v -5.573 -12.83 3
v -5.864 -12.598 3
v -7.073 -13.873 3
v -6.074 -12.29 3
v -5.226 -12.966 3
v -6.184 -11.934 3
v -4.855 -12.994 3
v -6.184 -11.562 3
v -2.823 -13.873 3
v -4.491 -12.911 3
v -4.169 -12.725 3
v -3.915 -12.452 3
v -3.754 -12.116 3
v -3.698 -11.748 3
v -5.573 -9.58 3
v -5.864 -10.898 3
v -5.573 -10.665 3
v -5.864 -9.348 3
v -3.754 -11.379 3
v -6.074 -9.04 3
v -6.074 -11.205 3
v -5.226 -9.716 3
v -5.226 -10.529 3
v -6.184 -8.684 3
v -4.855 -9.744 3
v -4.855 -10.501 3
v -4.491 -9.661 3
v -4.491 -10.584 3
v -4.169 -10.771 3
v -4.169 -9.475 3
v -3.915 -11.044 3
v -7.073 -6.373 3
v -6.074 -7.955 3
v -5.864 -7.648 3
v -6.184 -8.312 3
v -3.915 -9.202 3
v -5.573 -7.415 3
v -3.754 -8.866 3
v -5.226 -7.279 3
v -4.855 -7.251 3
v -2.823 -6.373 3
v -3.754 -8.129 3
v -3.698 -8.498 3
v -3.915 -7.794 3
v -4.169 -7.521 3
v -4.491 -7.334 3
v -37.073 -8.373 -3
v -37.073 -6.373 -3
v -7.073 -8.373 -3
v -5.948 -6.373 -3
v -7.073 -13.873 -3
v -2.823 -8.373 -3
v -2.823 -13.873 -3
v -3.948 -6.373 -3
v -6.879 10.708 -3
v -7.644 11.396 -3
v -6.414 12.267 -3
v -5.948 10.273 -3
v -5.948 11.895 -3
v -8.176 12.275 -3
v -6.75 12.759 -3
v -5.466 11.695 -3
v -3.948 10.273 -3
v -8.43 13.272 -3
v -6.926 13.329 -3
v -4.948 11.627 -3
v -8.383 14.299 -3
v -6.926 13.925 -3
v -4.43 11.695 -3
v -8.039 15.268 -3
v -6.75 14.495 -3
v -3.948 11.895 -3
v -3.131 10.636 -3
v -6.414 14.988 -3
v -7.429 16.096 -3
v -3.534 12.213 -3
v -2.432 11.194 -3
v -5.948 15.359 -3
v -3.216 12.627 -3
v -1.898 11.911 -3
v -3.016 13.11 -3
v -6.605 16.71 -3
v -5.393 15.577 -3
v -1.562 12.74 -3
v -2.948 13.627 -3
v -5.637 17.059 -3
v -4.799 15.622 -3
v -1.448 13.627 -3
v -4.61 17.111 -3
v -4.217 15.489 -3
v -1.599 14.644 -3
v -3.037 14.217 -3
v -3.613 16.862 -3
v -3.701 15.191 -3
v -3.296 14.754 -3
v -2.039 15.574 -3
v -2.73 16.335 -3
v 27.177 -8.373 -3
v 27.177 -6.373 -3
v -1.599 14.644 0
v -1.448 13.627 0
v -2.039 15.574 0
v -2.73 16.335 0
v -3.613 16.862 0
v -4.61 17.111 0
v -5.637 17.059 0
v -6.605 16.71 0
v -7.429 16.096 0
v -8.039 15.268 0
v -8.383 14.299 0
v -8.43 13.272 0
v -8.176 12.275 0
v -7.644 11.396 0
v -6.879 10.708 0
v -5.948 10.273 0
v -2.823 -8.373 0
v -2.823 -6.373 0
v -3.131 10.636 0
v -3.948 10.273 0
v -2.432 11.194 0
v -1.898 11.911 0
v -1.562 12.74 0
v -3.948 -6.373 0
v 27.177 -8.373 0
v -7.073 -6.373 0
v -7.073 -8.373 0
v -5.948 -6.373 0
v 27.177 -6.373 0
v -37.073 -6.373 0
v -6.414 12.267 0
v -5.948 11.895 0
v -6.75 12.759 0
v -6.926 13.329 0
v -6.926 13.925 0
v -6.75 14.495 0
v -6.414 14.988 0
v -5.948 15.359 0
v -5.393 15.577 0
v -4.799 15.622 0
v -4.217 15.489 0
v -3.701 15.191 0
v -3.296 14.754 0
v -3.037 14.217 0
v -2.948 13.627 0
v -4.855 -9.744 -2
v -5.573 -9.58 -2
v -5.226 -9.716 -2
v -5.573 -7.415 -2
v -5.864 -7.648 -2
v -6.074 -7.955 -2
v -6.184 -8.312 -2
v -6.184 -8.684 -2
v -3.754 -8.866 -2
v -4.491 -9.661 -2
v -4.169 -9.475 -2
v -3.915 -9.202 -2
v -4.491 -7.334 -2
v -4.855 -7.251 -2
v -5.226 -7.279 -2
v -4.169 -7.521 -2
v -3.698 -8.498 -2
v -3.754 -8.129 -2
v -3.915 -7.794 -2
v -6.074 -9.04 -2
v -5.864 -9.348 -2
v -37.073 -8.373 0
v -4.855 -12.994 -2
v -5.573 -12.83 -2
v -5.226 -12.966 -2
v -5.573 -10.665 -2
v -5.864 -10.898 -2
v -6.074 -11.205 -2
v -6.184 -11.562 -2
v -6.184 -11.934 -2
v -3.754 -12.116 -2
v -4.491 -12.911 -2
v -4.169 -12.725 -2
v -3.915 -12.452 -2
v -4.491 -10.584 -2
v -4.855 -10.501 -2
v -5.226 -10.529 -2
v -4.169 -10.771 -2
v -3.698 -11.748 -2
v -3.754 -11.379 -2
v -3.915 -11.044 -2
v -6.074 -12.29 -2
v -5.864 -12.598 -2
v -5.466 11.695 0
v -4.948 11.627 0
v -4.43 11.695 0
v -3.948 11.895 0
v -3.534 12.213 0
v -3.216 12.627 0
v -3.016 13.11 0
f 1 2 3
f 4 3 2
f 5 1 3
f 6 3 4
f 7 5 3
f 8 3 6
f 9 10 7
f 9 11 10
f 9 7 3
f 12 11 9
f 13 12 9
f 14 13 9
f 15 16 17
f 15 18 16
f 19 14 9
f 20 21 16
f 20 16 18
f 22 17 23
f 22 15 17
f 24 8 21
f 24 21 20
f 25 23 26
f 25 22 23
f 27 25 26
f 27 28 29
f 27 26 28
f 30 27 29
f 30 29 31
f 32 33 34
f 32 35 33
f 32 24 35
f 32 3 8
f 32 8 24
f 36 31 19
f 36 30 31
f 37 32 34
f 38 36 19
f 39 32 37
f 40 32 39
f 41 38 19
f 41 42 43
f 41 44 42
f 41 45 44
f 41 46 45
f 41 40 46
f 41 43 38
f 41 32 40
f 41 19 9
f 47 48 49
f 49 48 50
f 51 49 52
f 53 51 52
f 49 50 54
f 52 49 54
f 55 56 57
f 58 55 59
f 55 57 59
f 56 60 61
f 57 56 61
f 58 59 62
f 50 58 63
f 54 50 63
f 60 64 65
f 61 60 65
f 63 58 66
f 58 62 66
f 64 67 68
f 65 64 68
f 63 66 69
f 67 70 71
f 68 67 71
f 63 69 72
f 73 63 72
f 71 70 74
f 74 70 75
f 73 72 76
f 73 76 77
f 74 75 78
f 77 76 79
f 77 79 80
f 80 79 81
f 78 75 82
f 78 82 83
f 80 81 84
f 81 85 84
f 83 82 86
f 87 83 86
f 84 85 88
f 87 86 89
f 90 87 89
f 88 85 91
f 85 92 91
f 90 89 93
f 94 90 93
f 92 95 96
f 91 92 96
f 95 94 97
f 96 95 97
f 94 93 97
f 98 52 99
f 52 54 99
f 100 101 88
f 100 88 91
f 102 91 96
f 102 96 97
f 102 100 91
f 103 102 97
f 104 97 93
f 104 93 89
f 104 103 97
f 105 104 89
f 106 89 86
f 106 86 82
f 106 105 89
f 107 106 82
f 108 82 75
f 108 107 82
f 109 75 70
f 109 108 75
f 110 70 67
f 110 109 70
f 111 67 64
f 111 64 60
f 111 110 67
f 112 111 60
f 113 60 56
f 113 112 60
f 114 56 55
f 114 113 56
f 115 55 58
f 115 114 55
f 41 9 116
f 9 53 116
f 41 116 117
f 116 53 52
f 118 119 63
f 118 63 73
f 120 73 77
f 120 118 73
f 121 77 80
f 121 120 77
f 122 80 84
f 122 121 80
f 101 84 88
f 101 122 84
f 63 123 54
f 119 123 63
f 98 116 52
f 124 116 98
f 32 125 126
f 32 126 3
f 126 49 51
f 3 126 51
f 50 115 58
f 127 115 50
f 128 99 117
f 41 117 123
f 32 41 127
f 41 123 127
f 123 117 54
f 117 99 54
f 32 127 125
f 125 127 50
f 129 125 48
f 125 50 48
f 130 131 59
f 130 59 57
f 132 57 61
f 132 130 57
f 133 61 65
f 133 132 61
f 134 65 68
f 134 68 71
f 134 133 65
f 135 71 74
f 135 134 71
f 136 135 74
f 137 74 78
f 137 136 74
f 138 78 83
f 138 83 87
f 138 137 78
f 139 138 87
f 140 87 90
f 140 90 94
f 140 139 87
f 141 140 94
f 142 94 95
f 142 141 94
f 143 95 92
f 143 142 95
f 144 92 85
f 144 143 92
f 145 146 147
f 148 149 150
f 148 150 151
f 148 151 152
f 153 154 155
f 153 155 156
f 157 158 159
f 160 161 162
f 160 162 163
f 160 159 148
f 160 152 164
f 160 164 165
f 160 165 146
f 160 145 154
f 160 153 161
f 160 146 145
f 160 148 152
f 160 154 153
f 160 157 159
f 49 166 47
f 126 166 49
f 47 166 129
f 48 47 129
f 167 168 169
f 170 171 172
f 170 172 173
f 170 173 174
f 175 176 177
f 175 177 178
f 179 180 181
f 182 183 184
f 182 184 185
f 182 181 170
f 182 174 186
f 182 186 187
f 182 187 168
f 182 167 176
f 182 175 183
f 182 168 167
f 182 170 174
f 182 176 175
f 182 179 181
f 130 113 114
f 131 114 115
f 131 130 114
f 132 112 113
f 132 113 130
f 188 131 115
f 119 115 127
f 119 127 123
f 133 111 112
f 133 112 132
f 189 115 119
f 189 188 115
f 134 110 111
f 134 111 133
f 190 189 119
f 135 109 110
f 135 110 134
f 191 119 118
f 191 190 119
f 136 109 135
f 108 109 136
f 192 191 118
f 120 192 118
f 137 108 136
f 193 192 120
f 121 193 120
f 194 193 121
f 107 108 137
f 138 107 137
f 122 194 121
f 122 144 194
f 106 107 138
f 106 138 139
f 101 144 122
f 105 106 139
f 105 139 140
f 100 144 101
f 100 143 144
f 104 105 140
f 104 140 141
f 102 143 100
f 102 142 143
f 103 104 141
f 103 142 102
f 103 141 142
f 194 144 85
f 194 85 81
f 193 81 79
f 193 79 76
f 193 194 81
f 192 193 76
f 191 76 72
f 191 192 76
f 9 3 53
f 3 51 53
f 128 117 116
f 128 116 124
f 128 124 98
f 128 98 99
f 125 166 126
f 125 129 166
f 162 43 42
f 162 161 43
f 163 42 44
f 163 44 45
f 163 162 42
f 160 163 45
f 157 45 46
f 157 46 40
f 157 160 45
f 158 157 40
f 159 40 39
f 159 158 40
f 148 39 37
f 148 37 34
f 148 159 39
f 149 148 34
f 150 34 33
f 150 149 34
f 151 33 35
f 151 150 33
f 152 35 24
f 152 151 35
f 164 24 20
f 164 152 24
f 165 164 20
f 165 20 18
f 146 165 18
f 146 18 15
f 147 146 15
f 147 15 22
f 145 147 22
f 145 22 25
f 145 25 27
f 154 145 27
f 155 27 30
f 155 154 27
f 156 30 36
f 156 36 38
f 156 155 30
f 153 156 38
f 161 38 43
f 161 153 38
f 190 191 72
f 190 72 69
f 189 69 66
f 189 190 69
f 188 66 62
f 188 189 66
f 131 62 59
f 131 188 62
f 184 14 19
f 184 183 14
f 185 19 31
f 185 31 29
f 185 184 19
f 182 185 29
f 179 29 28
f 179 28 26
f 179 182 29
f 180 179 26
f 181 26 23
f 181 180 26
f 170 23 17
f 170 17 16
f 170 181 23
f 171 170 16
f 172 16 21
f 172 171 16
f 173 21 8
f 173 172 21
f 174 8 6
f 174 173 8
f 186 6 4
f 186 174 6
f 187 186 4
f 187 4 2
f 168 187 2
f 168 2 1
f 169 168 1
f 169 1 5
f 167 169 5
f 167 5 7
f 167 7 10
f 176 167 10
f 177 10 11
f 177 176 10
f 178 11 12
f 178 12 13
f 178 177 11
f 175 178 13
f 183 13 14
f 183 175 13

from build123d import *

# Parameters (mm, degrees)
F0_R     = 1.25
F0_W     = 30
F0_H     = 2
F1_DEPTH = 3
F2_DEPTH = 3
F3_DEPTH = 2


with BuildPart() as f1:
    # F0 (on Top) → F1 (new body)
    with BuildSketch(Plane.XY):
        Polygon((-5.94798, -6.372835), (-7.07298, -6.372835), (-7.07298, -8.372835), (-7.07298, -13.872835), (-2.82298, -13.872835), (-2.82298, -8.372835), (-2.82298, -6.372835), (-3.94798, -6.372835), align=None)
        with Locations((-4.94798, -11.747835)):
            Circle(F0_R, mode=Mode.SUBTRACT)
        with Locations((-4.94798, -8.497835)):
            Circle(F0_R, mode=Mode.SUBTRACT)
        with Locations((-22.07298, -7.372835)):
            Rectangle(F0_W, F0_H)
        with BuildLine():
            Line((-5.94798, 10.273063), (-5.94798, -6.372835))
            Line((-5.94798, -6.372835), (-3.94798, -6.372835))
            Line((-3.94798, -6.372835), (-3.94798, 10.273063))
            ThreePointArc((-3.94798, 10.273063), (-4.94798, 10.127165), (-5.94798, 10.273063))
        make_face()
        with BuildLine():
            ThreePointArc((-1.44798, 13.627165), (-7.03963, 16.433408), (-5.94798, 10.273063))
            Line((-5.94798, 10.273063), (-5.94798, 11.895114))
            ThreePointArc((-5.94798, 11.895114), (-5.94798, 15.359216), (-2.94798, 13.627165))
            ThreePointArc((-2.94798, 13.627165), (-3.215929, 12.627165), (-3.94798, 11.895114))
            Line((-3.94798, 11.895114), (-3.94798, 10.273063))
            ThreePointArc((-3.94798, 10.273063), (-2.141737, 11.535515), (-1.44798, 13.627165))
        make_face()
        with Locations((12.17702, -7.372835)):
            Rectangle(F0_W, F0_H)
        with BuildLine():
            Line((-5.94798, 11.895114), (-5.94798, 10.273063))
            ThreePointArc((-5.94798, 10.273063), (-4.94798, 10.127165), (-3.94798, 10.273063))
            Line((-3.94798, 10.273063), (-3.94798, 11.895114))
            ThreePointArc((-3.94798, 11.895114), (-4.94798, 11.627165), (-5.94798, 11.895114))
        make_face()
        with Locations((-4.94798, -8.497835)):
            Circle(F0_R)
        with Locations((-4.94798, -11.747835)):
            Circle(F0_R)
    extrude(amount=-F1_DEPTH)

    # F0 (on Top) → F2 (join)
    with BuildSketch(Plane.XY):
        Polygon((-5.94798, -6.372835), (-7.07298, -6.372835), (-7.07298, -8.372835), (-7.07298, -13.872835), (-2.82298, -13.872835), (-2.82298, -8.372835), (-2.82298, -6.372835), (-3.94798, -6.372835), align=None)
        with Locations((-4.94798, -11.747835)):
            Circle(F0_R, mode=Mode.SUBTRACT)
        with Locations((-4.94798, -8.497835)):
            Circle(F0_R, mode=Mode.SUBTRACT)
    extrude(amount=F2_DEPTH)

    # F0 (on Top) → F3 (cut)
    with BuildSketch(Plane.XY):
        with Locations((-4.94798, -8.497835)):
            Circle(F0_R)
        with Locations((-4.94798, -11.747835)):
            Circle(F0_R)
    extrude(amount=-F3_DEPTH, mode=Mode.SUBTRACT)


solid = f1.part
